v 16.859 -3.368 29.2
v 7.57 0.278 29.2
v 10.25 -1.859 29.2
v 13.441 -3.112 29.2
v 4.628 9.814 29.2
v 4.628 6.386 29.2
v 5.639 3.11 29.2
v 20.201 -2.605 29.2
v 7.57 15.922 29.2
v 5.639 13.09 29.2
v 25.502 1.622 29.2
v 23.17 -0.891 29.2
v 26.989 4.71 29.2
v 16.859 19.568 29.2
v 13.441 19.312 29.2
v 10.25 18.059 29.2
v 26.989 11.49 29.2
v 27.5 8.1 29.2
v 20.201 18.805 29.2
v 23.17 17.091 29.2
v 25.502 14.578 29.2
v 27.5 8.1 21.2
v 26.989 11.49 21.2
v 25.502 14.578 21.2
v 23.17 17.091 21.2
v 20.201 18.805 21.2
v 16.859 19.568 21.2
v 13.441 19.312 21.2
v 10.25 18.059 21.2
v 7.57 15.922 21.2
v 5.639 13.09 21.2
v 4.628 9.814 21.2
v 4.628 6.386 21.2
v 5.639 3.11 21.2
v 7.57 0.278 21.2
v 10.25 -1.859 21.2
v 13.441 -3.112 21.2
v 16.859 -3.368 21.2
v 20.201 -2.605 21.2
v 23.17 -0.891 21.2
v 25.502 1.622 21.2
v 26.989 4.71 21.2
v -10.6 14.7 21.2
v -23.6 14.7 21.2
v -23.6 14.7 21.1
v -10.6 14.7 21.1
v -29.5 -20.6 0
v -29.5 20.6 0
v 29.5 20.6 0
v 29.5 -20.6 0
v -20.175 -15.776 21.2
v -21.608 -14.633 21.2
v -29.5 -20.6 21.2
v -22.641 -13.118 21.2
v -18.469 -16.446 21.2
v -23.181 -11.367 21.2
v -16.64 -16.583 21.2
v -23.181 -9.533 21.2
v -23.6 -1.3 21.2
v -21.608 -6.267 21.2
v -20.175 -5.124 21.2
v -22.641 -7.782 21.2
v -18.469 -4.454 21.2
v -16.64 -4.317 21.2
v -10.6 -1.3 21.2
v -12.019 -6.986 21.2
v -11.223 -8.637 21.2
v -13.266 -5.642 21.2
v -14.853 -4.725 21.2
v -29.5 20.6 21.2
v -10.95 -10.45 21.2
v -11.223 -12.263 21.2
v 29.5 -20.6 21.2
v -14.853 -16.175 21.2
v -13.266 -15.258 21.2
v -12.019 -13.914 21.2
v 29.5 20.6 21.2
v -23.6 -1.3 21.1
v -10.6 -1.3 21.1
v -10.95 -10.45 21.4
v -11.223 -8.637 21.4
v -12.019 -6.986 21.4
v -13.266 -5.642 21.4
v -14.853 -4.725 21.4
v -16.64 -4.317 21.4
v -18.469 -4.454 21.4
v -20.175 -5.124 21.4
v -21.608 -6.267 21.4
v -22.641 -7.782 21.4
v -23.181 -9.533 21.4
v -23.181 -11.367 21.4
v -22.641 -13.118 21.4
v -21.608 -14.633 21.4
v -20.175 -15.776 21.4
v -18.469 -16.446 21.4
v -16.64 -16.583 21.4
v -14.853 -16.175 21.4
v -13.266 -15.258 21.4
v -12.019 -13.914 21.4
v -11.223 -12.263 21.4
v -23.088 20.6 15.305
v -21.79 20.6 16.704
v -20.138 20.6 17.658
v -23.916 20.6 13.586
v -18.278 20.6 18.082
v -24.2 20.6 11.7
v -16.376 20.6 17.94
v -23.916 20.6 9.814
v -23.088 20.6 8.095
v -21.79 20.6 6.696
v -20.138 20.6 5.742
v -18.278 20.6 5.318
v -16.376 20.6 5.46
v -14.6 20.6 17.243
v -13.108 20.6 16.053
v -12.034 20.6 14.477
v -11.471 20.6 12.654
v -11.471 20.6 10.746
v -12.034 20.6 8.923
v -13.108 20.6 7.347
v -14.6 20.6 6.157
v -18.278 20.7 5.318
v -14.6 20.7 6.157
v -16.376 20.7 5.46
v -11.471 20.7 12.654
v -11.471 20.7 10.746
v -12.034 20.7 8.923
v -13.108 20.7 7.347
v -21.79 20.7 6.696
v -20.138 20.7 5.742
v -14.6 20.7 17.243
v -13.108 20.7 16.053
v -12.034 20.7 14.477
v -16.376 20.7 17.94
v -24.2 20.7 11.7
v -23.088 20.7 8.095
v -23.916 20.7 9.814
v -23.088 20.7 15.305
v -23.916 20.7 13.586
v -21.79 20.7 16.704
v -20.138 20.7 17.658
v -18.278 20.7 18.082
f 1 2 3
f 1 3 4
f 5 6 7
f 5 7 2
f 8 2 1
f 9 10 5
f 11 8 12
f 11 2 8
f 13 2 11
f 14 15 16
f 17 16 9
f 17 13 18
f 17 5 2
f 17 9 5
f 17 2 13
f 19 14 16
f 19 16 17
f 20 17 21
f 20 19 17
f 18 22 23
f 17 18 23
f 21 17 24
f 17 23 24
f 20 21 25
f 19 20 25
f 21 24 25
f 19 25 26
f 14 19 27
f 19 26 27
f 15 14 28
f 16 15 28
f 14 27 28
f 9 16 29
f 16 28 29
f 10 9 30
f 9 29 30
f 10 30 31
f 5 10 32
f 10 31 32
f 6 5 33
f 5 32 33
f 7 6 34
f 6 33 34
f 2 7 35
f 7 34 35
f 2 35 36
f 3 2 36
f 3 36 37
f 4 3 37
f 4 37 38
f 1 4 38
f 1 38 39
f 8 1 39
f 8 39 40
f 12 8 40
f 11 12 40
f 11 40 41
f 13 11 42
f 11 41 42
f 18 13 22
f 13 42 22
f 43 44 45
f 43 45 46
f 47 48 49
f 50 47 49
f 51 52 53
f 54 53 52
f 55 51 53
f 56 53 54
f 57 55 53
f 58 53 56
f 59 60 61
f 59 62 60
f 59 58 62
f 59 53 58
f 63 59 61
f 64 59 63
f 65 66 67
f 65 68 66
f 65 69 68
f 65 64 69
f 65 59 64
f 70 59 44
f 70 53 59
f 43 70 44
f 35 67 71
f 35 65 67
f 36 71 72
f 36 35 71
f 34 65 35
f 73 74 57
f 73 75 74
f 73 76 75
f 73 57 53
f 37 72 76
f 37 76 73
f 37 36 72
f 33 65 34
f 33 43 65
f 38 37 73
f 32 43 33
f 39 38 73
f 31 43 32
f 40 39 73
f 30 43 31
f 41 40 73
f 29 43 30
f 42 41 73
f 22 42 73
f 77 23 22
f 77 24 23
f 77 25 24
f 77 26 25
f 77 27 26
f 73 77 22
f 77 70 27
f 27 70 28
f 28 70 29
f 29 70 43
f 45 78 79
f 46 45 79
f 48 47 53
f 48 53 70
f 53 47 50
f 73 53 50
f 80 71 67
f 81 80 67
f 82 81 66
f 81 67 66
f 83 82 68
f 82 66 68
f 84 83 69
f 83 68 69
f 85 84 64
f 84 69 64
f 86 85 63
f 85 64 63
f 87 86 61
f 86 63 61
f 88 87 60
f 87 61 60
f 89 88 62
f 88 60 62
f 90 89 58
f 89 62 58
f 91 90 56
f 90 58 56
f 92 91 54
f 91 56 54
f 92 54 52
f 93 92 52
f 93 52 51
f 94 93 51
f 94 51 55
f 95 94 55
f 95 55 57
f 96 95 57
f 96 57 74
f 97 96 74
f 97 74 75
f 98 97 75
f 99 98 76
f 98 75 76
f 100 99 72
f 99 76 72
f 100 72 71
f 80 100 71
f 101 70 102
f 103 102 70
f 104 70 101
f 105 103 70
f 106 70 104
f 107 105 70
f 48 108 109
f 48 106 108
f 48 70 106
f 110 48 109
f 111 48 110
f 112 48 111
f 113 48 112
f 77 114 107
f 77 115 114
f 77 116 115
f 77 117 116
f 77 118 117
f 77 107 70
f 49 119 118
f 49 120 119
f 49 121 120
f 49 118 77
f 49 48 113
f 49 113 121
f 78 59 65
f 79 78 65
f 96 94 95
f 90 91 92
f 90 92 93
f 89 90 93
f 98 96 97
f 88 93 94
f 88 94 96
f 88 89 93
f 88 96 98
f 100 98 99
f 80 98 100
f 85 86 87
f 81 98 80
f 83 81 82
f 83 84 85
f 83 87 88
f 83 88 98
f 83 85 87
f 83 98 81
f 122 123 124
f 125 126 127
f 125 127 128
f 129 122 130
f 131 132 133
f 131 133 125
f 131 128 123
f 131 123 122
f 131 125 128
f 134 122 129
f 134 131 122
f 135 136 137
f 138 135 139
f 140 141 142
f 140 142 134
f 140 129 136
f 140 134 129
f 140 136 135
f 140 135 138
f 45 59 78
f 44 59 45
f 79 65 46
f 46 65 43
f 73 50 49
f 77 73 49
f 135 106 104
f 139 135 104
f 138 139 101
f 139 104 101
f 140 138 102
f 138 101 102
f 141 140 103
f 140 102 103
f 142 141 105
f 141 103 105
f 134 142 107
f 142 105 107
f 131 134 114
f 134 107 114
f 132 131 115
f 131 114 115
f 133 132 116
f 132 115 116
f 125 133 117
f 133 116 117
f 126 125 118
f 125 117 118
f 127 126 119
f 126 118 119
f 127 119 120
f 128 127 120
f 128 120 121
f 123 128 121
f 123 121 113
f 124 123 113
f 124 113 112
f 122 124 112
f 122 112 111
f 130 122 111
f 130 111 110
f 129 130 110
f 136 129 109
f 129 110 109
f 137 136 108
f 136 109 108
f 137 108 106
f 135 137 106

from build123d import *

# Parameters (mm, degrees)
F0_W     = 59
F0_H     = 41.2
F1_DEPTH = 21.2
F2_R     = 11.5
F3_DEPTH = 8
F4_R     = 6.4
F5_DEPTH = 0.1
F6_W     = 13
F6_H     = 16
F7_DEPTH = 0.1
F8_R     = 6.15
F9_DEPTH = 0.2


with BuildPart() as f1:
    # F0 (on Top) → F1 (new body)
    with BuildSketch(Plane.XY):
        Rectangle(F0_W, F0_H)
    extrude(amount=F1_DEPTH)

    # F2 (on face) → F3 (join)
    with BuildSketch(Plane.XY.offset(21.2)):
        with Locations((16, 8.1)):
            Circle(F2_R)
    extrude(amount=F3_DEPTH)

    # F4 (on face) → F5 (join)
    with BuildSketch(Plane(origin=(0, 20.6, 0), x_dir=(-1, 0, 0), z_dir=(0, 1, 0))):
        with Locations((17.8, 11.7)):
            Circle(F4_R)
    extrude(amount=F5_DEPTH)

    # F6 (on face) → F7 (cut)
    with BuildSketch(Plane.XY.offset(21.2)):
        with Locations((-17.1, 6.7)):
            Rectangle(F6_W, F6_H)
    extrude(amount=-F7_DEPTH, mode=Mode.SUBTRACT)

    # F8 (on face) → F9 (join)
    with BuildSketch(Plane.XY.offset(21.2)):
        with Locations((-17.1, -10.45)):
            Circle(F8_R)
    extrude(amount=F9_DEPTH)


solid = f1.part
